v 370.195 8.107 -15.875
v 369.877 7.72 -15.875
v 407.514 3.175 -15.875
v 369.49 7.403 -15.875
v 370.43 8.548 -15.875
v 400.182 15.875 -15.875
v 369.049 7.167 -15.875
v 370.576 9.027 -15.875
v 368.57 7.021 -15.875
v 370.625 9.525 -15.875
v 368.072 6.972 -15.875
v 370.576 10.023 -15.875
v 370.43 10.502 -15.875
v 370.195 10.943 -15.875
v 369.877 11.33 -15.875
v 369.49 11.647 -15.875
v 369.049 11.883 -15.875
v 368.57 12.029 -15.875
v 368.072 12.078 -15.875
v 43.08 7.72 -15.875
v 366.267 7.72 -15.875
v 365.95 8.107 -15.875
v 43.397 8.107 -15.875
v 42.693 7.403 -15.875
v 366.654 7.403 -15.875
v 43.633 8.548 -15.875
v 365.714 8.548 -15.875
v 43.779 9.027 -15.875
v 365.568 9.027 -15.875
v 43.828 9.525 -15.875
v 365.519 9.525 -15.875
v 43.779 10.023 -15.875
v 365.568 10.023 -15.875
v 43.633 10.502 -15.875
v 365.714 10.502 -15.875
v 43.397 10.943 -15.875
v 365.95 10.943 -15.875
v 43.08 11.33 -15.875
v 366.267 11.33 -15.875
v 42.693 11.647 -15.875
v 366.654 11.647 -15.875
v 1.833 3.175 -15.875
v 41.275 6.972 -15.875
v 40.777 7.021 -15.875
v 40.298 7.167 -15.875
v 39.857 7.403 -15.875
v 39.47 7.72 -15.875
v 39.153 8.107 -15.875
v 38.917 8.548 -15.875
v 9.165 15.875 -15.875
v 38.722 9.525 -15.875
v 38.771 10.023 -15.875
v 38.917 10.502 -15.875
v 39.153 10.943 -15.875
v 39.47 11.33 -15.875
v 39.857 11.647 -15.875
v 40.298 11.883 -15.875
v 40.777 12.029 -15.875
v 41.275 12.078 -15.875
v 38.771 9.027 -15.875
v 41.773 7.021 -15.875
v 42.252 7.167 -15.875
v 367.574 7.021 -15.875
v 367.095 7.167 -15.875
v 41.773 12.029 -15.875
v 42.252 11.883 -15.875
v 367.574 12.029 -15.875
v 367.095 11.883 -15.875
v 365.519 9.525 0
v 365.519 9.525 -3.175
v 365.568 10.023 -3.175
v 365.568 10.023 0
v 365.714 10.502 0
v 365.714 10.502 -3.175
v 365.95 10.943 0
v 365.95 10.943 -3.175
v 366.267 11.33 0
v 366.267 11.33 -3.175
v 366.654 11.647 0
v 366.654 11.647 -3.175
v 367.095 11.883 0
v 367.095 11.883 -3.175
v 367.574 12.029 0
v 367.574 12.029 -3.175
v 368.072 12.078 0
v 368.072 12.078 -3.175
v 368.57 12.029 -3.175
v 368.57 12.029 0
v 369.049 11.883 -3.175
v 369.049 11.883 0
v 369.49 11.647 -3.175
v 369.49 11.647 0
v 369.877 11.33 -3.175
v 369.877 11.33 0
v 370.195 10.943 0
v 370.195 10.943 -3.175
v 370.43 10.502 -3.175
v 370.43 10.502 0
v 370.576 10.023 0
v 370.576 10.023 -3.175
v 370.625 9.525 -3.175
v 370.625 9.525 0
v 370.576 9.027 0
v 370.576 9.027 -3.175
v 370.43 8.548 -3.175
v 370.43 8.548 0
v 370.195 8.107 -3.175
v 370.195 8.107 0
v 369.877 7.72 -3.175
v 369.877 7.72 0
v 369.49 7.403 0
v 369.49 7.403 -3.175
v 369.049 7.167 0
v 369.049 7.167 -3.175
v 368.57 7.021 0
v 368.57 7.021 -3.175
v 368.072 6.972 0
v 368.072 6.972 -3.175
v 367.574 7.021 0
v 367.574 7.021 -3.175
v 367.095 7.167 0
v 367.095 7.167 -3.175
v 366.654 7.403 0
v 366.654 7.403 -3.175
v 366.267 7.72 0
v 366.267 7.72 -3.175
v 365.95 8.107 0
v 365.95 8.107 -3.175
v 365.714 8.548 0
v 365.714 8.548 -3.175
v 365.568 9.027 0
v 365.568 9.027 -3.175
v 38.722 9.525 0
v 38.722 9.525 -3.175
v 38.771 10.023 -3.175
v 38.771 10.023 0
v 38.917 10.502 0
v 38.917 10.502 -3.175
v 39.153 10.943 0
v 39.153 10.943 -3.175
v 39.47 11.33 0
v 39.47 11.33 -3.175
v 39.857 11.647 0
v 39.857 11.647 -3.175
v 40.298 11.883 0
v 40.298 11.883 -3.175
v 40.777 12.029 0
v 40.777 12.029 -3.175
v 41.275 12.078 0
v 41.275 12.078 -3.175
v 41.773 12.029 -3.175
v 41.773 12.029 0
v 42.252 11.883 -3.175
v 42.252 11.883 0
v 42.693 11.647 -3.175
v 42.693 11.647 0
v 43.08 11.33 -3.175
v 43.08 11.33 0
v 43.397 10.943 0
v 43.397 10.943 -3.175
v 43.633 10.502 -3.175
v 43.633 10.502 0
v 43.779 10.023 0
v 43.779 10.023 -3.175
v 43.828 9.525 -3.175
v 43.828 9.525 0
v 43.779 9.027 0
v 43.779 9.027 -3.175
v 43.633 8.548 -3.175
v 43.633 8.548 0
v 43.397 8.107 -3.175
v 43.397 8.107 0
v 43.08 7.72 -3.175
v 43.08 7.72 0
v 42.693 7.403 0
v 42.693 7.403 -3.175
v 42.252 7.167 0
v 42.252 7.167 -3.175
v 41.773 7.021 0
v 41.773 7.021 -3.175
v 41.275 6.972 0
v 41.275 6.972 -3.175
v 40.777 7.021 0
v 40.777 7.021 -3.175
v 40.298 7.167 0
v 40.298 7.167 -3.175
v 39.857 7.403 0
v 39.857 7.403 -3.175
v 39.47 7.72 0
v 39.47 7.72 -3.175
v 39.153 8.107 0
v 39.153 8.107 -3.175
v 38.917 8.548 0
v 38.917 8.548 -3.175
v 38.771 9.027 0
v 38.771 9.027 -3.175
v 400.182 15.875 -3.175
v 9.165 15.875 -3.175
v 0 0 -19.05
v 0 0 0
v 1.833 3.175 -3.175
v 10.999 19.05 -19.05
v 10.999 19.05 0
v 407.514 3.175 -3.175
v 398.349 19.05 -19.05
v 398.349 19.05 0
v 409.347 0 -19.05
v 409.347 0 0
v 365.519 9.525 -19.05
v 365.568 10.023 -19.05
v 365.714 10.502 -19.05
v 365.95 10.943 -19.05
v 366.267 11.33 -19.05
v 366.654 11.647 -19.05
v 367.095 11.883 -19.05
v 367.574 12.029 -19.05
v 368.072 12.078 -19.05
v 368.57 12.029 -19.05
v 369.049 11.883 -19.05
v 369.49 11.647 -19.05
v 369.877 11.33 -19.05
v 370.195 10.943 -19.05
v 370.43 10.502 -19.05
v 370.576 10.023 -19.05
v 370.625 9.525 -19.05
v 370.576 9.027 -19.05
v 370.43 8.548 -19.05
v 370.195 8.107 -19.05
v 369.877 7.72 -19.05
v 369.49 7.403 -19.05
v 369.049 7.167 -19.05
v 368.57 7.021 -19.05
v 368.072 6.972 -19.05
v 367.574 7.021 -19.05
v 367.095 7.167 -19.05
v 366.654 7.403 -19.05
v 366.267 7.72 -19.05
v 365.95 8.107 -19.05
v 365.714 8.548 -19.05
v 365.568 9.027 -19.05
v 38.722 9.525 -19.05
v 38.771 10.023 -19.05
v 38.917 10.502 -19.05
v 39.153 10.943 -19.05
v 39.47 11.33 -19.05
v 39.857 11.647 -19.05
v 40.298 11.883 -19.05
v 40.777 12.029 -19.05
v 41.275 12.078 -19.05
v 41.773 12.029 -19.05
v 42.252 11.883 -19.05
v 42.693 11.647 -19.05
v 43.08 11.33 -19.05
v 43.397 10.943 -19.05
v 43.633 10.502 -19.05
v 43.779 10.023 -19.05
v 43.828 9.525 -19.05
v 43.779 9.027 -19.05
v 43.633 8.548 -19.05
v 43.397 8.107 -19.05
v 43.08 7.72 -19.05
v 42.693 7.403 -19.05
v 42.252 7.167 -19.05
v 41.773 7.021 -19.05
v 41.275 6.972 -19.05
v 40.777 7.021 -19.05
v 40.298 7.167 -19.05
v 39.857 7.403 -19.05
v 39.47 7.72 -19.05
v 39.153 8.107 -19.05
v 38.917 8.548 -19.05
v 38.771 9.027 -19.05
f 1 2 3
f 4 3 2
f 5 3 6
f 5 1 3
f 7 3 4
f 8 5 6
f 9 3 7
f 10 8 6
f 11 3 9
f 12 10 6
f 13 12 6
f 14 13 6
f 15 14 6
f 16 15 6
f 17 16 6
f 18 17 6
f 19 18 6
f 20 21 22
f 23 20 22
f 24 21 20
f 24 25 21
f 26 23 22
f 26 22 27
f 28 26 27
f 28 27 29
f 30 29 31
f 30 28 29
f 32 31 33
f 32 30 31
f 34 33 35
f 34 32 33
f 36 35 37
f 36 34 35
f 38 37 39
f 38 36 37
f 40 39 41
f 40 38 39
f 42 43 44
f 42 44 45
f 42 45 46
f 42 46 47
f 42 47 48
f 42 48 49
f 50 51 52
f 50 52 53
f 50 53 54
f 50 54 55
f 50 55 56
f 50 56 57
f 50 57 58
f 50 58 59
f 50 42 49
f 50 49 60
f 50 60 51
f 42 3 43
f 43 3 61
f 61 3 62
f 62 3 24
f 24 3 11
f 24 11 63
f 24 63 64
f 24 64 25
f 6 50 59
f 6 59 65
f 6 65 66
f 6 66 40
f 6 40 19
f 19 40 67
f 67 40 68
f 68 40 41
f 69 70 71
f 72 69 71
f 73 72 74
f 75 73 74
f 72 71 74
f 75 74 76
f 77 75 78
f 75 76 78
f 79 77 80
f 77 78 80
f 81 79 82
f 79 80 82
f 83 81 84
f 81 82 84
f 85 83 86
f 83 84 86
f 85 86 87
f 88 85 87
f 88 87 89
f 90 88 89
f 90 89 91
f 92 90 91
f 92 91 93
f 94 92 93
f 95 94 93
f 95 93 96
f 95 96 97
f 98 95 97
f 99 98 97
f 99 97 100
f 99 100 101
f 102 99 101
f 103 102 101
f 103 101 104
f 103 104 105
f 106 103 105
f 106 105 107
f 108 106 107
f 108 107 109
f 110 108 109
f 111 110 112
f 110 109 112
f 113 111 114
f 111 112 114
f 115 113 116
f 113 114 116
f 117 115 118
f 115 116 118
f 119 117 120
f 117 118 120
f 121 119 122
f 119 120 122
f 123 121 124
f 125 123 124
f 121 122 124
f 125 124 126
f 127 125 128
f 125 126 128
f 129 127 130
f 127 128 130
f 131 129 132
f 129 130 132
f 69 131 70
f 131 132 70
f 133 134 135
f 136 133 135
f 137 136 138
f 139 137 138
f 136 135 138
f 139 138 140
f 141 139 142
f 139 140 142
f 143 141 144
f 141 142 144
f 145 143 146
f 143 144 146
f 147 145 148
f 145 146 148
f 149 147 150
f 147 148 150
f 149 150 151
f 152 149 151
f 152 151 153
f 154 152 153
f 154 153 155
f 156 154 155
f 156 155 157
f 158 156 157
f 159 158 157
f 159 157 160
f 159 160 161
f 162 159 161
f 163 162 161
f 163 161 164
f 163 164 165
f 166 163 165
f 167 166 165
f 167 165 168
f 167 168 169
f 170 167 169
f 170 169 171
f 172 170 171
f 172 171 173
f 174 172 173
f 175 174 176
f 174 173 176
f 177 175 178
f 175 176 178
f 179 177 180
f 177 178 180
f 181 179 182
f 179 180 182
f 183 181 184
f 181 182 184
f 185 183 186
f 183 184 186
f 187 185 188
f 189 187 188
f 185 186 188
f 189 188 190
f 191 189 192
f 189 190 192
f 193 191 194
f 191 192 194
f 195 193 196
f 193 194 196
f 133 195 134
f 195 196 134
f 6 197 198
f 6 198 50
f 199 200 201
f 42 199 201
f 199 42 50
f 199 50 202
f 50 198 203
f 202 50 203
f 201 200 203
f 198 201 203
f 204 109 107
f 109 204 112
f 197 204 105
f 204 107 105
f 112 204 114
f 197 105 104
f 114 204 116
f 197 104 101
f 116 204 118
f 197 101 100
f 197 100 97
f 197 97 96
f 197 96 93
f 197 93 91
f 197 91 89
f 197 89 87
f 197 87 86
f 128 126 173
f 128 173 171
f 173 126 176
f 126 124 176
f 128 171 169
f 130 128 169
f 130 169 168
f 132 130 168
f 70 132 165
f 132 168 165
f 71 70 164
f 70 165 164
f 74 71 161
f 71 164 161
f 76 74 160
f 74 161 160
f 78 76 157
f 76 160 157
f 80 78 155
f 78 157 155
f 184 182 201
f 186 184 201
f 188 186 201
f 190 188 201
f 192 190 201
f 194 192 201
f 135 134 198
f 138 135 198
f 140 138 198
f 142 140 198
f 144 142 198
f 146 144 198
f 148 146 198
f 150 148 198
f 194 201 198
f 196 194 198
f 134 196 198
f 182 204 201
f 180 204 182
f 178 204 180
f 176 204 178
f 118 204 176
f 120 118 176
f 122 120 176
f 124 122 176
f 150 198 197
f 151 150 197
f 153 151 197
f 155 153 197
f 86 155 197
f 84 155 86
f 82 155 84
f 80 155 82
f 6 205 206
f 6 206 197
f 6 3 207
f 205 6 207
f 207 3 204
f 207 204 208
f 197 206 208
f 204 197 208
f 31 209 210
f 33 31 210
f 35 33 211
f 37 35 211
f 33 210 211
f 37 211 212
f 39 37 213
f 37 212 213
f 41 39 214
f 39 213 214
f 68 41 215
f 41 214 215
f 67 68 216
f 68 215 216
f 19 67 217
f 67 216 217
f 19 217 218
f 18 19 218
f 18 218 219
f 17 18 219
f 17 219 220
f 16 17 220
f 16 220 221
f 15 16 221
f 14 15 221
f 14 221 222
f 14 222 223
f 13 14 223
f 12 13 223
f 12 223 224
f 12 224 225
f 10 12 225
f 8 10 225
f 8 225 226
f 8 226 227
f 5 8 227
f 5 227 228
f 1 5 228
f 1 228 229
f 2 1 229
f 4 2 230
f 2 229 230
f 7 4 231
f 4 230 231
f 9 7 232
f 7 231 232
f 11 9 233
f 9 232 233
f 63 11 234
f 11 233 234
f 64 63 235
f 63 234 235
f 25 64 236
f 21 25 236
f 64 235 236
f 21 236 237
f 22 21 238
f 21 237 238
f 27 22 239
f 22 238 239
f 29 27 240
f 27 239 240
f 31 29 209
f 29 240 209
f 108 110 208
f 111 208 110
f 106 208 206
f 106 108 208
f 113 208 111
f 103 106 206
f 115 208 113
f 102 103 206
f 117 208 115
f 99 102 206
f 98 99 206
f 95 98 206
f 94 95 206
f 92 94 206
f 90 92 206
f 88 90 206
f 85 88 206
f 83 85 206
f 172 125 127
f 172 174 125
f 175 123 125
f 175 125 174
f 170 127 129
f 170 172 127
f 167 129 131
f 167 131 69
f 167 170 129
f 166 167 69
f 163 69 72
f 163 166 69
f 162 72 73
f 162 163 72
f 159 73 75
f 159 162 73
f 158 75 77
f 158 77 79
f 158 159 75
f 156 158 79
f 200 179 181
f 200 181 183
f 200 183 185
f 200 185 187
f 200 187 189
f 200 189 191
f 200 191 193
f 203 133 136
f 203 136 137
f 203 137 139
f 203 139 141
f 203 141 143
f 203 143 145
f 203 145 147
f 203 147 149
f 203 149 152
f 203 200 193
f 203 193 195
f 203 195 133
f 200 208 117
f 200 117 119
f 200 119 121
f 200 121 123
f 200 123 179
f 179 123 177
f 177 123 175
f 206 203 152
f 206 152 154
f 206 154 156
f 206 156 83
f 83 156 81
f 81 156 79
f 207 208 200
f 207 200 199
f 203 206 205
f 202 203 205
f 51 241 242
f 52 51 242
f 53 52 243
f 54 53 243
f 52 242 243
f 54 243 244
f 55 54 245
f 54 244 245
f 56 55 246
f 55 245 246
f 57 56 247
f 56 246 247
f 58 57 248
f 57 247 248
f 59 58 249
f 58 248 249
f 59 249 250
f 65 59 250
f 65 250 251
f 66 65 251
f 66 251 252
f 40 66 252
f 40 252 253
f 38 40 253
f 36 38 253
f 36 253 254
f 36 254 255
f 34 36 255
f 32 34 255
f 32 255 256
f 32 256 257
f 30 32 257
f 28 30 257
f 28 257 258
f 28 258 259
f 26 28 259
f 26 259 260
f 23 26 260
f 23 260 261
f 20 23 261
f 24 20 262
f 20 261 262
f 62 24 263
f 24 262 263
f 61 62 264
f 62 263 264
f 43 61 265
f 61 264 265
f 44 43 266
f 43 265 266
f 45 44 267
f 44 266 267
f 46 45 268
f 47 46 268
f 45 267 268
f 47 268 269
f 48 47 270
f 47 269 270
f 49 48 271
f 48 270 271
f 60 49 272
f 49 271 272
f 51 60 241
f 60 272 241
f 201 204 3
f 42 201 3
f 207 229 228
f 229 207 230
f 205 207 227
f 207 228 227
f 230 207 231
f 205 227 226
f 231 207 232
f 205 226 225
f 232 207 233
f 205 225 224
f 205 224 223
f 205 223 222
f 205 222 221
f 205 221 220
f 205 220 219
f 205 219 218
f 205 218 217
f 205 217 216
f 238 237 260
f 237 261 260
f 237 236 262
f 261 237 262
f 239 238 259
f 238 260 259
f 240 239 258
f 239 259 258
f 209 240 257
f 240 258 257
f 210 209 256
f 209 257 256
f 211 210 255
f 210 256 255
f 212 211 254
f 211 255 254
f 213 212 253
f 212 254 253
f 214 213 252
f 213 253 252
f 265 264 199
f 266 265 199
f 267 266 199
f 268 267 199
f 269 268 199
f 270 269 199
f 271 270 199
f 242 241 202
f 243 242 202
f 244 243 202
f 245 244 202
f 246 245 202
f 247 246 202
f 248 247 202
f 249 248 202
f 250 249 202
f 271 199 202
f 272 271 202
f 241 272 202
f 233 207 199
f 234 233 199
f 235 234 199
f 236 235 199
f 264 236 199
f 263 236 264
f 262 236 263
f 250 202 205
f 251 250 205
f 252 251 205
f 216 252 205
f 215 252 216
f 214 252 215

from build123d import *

# Parameters (mm, degrees)
SKETCH1_W              = 19.05
SKETCH1_H              = 19.05
SKETCH1_W_2            = 12.7
SKETCH1_H_2            = 12.7
BOSS_EXTRUDE1_DEPTH    = 431.8
CUT_EXTRUDE1_DEPTH     = 20.05
F_10_CLEARANCE_HOLE1_D = 5.1054


with BuildPart() as part:
    # Sketch1 → Boss-Extrude1 (new body)
    with BuildSketch(Plane(origin=(0, 0, 0), x_dir=(0, 0, -1), z_dir=(1, 0, 0))):
        with Locations((9.525, 9.525)):
            Rectangle(SKETCH1_W, SKETCH1_H)
        with Locations((9.525, 9.525)):
            Rectangle(SKETCH1_W_2, SKETCH1_H_2, mode=Mode.SUBTRACT)
    extrude(amount=BOSS_EXTRUDE1_DEPTH)

    # Sketch2 → Cut-Extrude1 (cut, through all)
    with BuildSketch(Plane.XY):
        Polygon((398.348522628, 19.05), (409.347045256, 0), (431.8, 0), (431.8, 19.05), align=None)
        Polygon((0, 19.05), (0, 0), (10.998522628, 19.05), align=None)
    extrude(amount=-CUT_EXTRUDE1_DEPTH, mode=Mode.SUBTRACT)

    # #10 Clearance Hole1 (through all)
    with Locations(Plane(origin=(368.072045256, 9.525, 0), x_dir=(1, 0, 0), z_dir=(0, 0, 1))):
        with Locations((0, 0), (-326.797045256, 0)):
            Hole(F_10_CLEARANCE_HOLE1_D / 2)


solid = part.part
